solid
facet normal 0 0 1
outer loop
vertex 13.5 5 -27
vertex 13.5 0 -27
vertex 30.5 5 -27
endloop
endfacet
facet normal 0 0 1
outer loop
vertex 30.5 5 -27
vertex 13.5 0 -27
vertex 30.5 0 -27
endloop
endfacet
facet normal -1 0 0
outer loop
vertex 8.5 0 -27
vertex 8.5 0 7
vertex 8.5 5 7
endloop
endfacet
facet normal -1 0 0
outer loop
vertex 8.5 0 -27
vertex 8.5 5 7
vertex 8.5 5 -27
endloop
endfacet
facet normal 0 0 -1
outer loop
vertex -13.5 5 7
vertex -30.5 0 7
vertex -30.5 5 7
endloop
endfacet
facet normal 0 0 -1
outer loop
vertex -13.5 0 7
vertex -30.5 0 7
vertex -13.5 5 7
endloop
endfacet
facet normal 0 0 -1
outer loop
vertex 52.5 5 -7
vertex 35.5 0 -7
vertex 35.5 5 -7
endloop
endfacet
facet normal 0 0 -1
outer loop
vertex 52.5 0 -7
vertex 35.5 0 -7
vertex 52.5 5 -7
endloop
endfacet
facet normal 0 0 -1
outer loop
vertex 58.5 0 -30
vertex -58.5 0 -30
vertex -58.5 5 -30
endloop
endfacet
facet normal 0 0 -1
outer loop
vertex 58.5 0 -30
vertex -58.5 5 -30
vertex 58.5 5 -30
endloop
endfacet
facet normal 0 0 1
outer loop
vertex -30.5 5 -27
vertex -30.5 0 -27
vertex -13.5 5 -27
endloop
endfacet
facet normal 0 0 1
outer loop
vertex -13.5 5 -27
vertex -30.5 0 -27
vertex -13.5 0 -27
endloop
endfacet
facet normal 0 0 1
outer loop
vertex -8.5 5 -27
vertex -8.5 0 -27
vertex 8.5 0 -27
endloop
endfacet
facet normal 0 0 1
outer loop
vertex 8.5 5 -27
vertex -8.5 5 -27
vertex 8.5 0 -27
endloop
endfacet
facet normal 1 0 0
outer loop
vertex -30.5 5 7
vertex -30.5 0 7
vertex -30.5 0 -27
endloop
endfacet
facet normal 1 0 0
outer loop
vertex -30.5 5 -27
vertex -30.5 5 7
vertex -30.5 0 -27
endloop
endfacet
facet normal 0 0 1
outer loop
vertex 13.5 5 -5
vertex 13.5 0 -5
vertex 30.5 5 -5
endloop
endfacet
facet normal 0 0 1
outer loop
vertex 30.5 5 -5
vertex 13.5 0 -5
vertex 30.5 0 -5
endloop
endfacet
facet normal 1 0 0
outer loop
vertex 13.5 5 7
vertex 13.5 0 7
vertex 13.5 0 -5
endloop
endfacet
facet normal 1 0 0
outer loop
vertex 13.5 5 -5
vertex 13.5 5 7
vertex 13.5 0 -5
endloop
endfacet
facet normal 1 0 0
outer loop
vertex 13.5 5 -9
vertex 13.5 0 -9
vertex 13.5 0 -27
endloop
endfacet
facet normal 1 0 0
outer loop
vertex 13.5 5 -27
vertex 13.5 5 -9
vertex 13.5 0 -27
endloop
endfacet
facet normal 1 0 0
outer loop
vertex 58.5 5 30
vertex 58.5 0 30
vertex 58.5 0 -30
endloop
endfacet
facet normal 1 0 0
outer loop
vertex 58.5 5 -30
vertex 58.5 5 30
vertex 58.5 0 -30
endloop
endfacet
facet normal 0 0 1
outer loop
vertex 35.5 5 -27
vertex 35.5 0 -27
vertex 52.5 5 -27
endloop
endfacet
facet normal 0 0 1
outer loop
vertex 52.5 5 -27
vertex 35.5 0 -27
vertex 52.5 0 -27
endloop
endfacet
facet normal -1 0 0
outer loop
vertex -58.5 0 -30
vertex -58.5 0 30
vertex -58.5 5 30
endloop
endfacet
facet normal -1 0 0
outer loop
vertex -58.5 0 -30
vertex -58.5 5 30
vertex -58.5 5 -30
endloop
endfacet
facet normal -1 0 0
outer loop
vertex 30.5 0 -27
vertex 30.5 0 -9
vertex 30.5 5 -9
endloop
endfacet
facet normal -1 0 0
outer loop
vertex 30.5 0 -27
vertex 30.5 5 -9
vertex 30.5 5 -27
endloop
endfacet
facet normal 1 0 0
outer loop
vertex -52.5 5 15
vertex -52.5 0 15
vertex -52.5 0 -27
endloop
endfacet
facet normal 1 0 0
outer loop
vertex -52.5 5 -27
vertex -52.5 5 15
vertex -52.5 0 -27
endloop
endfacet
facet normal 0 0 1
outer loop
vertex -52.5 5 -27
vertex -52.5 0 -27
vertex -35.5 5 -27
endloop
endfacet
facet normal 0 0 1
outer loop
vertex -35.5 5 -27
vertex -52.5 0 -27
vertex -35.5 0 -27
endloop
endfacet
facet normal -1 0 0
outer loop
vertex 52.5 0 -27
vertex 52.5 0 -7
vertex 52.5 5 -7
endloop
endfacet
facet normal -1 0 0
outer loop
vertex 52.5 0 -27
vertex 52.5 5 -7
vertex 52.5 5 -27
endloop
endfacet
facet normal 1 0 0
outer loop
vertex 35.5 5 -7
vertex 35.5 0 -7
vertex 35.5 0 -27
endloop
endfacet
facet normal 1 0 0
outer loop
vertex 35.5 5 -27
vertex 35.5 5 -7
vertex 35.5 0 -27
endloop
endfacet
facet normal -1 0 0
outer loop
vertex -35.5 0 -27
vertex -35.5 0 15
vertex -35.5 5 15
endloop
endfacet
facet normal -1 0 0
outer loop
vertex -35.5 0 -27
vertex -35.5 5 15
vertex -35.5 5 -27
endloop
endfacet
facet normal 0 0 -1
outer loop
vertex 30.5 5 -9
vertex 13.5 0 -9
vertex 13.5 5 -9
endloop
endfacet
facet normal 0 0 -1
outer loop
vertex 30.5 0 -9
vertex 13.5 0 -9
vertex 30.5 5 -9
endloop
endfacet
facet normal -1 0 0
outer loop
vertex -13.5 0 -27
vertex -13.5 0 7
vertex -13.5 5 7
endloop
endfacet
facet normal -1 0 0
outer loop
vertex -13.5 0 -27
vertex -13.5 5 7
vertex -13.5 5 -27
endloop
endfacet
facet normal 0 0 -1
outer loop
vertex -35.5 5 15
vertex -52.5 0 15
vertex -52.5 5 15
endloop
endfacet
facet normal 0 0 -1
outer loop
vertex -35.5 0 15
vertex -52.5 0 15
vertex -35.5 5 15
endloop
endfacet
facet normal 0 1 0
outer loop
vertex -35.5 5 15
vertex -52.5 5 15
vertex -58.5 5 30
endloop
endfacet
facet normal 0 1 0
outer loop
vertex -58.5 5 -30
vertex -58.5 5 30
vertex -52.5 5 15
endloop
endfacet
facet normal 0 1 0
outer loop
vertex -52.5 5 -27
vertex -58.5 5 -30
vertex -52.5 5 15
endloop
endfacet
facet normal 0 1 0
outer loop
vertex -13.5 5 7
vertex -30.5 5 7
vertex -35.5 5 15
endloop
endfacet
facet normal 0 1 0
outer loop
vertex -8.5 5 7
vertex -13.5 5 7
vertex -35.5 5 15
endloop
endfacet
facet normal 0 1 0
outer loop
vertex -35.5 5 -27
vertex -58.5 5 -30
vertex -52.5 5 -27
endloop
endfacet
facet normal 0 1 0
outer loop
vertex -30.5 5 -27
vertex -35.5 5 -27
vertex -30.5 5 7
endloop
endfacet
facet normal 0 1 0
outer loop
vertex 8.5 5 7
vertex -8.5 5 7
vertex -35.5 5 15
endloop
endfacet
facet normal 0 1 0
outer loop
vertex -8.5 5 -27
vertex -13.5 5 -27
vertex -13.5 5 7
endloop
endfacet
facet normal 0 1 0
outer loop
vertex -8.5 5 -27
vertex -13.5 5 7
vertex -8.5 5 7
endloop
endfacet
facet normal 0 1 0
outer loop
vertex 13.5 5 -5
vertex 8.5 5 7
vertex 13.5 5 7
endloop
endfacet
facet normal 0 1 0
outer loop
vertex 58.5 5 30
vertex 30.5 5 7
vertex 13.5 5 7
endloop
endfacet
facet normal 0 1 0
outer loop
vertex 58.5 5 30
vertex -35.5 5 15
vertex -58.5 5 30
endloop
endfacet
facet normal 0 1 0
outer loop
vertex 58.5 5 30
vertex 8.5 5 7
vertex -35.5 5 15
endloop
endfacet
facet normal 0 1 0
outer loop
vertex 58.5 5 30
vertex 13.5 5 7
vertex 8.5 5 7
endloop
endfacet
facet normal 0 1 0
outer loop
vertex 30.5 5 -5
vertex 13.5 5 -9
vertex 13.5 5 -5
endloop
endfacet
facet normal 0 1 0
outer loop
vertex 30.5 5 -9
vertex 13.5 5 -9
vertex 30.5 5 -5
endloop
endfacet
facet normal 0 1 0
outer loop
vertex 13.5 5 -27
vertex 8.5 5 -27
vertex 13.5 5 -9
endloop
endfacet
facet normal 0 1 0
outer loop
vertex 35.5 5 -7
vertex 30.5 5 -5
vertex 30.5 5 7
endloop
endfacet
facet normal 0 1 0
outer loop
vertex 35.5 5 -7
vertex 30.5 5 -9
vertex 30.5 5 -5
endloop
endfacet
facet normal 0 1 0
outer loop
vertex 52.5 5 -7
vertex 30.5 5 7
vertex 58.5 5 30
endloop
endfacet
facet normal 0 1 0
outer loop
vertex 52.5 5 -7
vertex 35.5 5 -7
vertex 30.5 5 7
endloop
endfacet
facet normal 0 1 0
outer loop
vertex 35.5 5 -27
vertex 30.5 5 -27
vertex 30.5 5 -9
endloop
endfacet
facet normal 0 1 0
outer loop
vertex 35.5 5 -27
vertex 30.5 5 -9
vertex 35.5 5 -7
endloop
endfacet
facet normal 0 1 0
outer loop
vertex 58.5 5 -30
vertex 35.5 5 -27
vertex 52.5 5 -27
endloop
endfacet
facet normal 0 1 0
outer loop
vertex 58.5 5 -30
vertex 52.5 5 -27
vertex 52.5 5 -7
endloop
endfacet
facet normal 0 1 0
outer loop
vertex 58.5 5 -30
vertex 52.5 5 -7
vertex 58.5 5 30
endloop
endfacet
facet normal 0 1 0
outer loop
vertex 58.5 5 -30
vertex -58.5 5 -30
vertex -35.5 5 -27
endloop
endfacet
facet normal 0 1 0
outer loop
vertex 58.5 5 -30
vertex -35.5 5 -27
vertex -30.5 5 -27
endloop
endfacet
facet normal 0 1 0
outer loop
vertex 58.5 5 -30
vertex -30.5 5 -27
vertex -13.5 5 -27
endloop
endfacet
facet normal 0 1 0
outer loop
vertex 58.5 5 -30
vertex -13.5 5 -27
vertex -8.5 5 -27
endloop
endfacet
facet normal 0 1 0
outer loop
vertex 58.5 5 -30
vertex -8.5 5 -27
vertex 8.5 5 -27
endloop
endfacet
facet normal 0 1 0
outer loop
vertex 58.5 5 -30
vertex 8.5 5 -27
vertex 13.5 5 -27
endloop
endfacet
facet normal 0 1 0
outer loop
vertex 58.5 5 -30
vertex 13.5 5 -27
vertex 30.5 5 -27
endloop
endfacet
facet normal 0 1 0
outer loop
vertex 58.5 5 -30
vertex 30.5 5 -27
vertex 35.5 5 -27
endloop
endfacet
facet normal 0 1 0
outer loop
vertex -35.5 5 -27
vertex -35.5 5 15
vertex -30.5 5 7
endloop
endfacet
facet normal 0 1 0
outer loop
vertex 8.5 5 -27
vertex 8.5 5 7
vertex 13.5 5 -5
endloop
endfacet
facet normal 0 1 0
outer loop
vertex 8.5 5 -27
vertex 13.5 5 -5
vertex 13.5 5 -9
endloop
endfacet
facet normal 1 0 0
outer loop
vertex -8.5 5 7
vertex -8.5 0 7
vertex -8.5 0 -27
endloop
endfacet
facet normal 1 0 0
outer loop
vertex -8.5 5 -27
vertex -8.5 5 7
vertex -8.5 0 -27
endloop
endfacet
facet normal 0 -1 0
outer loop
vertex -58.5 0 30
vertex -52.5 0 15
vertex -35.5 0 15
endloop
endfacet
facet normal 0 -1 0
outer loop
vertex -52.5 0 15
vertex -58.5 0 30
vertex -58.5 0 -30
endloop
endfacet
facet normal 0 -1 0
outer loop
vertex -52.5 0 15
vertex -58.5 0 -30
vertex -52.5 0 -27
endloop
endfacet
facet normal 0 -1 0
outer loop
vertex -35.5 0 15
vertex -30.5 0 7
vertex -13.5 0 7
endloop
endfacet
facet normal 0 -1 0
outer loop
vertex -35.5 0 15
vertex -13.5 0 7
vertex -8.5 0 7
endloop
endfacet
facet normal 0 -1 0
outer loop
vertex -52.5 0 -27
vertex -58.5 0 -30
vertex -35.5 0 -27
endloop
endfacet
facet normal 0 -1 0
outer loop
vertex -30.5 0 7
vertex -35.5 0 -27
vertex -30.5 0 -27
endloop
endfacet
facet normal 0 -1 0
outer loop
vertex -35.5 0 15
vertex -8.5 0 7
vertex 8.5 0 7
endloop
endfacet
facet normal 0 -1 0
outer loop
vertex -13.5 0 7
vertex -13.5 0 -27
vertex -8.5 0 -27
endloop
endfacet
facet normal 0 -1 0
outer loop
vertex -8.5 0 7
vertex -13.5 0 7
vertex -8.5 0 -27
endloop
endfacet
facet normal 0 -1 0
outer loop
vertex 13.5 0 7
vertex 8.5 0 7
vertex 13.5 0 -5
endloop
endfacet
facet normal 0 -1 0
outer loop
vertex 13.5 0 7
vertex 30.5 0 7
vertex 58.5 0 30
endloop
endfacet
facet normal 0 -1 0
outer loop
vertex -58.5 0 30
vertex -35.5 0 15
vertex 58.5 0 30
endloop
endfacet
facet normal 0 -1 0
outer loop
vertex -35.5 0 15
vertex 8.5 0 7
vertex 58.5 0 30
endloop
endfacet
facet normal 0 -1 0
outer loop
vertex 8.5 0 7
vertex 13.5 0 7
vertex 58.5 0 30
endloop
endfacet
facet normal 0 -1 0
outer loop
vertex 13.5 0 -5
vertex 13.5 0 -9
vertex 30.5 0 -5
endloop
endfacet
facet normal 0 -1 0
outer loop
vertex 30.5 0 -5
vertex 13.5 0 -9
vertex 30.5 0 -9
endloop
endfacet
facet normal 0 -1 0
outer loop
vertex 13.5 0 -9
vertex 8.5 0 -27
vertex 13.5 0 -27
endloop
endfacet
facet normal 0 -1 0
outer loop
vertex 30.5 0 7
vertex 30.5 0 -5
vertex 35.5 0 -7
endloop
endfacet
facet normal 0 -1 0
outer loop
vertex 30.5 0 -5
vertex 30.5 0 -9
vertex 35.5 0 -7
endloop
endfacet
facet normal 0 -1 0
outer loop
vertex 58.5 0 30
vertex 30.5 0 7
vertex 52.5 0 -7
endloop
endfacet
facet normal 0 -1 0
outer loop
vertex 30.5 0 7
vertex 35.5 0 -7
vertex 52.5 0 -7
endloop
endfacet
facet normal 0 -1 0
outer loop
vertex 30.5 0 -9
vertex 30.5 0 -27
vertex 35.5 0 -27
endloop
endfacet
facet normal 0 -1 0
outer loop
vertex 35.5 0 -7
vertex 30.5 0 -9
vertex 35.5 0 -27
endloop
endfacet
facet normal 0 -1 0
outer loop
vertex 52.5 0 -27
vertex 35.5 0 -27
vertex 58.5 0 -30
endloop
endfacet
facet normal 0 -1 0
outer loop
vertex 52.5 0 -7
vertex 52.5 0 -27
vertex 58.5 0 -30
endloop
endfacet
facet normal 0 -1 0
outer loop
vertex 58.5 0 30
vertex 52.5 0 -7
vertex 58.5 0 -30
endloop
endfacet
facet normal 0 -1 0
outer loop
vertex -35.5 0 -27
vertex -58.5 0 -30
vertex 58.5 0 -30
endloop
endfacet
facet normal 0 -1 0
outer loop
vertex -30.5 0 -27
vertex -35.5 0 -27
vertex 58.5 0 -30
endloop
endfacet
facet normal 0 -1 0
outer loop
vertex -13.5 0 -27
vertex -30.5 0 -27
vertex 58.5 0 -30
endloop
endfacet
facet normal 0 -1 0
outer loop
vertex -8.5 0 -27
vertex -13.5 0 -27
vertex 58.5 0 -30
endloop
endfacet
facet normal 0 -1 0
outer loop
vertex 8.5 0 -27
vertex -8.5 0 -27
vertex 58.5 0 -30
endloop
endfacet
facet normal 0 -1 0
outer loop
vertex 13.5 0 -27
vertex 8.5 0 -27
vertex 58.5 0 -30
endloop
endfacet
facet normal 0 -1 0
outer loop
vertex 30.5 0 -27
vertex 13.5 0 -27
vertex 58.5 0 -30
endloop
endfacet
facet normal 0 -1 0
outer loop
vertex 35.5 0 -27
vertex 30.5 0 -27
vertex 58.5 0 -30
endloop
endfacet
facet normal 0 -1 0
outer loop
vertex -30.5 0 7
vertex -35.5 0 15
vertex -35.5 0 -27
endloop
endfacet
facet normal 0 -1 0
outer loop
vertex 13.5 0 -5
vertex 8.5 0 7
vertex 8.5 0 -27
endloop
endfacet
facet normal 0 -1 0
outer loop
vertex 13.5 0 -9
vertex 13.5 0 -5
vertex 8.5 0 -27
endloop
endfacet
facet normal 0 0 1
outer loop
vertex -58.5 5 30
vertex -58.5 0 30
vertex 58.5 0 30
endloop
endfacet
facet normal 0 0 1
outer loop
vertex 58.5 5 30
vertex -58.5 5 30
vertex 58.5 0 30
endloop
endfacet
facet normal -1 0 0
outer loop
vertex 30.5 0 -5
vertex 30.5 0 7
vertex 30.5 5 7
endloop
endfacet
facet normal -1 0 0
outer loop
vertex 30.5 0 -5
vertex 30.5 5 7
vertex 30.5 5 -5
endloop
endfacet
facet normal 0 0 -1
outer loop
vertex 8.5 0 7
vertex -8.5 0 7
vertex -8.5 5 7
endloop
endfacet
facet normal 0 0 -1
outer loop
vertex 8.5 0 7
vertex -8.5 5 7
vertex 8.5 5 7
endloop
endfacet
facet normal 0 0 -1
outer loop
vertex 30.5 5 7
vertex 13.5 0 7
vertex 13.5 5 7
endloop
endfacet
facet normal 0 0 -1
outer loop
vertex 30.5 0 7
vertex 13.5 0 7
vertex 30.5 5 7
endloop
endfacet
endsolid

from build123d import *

# Parameters (mm, degrees)
SKETCH1_W           = 117
SKETCH1_H           = 60
SKETCH1_W_2         = 17
SKETCH1_H_2         = 18
SKETCH1_H_3         = 42
SKETCH1_H_4         = 34
SKETCH1_H_5         = 20
SKETCH1_H_6         = 12
BOSS_EXTRUDE1_DEPTH = 5


with BuildPart() as part:
    # Sketch1 → Boss-Extrude1 (new body)
    with BuildSketch(Plane(origin=(0, 0, 0), x_dir=(1, 0, 0), z_dir=(0, 1, 0))):
        Rectangle(SKETCH1_W, SKETCH1_H)
        with Locations((22, 18)):
            Rectangle(SKETCH1_W_2, SKETCH1_H_2, mode=Mode.SUBTRACT)
        with Locations((-44, 6)):
            Rectangle(SKETCH1_W_2, SKETCH1_H_3, mode=Mode.SUBTRACT)
        with Locations((-22, 10)):
            Rectangle(SKETCH1_W_2, SKETCH1_H_4, mode=Mode.SUBTRACT)
        with Locations((0, 10)):
            Rectangle(SKETCH1_W_2, SKETCH1_H_4, mode=Mode.SUBTRACT)
        with Locations((44, 17)):
            Rectangle(SKETCH1_W_2, SKETCH1_H_5, mode=Mode.SUBTRACT)
        with Locations((22, -1)):
            Rectangle(SKETCH1_W_2, SKETCH1_H_6, mode=Mode.SUBTRACT)
    extrude(amount=BOSS_EXTRUDE1_DEPTH)


solid = part.part
